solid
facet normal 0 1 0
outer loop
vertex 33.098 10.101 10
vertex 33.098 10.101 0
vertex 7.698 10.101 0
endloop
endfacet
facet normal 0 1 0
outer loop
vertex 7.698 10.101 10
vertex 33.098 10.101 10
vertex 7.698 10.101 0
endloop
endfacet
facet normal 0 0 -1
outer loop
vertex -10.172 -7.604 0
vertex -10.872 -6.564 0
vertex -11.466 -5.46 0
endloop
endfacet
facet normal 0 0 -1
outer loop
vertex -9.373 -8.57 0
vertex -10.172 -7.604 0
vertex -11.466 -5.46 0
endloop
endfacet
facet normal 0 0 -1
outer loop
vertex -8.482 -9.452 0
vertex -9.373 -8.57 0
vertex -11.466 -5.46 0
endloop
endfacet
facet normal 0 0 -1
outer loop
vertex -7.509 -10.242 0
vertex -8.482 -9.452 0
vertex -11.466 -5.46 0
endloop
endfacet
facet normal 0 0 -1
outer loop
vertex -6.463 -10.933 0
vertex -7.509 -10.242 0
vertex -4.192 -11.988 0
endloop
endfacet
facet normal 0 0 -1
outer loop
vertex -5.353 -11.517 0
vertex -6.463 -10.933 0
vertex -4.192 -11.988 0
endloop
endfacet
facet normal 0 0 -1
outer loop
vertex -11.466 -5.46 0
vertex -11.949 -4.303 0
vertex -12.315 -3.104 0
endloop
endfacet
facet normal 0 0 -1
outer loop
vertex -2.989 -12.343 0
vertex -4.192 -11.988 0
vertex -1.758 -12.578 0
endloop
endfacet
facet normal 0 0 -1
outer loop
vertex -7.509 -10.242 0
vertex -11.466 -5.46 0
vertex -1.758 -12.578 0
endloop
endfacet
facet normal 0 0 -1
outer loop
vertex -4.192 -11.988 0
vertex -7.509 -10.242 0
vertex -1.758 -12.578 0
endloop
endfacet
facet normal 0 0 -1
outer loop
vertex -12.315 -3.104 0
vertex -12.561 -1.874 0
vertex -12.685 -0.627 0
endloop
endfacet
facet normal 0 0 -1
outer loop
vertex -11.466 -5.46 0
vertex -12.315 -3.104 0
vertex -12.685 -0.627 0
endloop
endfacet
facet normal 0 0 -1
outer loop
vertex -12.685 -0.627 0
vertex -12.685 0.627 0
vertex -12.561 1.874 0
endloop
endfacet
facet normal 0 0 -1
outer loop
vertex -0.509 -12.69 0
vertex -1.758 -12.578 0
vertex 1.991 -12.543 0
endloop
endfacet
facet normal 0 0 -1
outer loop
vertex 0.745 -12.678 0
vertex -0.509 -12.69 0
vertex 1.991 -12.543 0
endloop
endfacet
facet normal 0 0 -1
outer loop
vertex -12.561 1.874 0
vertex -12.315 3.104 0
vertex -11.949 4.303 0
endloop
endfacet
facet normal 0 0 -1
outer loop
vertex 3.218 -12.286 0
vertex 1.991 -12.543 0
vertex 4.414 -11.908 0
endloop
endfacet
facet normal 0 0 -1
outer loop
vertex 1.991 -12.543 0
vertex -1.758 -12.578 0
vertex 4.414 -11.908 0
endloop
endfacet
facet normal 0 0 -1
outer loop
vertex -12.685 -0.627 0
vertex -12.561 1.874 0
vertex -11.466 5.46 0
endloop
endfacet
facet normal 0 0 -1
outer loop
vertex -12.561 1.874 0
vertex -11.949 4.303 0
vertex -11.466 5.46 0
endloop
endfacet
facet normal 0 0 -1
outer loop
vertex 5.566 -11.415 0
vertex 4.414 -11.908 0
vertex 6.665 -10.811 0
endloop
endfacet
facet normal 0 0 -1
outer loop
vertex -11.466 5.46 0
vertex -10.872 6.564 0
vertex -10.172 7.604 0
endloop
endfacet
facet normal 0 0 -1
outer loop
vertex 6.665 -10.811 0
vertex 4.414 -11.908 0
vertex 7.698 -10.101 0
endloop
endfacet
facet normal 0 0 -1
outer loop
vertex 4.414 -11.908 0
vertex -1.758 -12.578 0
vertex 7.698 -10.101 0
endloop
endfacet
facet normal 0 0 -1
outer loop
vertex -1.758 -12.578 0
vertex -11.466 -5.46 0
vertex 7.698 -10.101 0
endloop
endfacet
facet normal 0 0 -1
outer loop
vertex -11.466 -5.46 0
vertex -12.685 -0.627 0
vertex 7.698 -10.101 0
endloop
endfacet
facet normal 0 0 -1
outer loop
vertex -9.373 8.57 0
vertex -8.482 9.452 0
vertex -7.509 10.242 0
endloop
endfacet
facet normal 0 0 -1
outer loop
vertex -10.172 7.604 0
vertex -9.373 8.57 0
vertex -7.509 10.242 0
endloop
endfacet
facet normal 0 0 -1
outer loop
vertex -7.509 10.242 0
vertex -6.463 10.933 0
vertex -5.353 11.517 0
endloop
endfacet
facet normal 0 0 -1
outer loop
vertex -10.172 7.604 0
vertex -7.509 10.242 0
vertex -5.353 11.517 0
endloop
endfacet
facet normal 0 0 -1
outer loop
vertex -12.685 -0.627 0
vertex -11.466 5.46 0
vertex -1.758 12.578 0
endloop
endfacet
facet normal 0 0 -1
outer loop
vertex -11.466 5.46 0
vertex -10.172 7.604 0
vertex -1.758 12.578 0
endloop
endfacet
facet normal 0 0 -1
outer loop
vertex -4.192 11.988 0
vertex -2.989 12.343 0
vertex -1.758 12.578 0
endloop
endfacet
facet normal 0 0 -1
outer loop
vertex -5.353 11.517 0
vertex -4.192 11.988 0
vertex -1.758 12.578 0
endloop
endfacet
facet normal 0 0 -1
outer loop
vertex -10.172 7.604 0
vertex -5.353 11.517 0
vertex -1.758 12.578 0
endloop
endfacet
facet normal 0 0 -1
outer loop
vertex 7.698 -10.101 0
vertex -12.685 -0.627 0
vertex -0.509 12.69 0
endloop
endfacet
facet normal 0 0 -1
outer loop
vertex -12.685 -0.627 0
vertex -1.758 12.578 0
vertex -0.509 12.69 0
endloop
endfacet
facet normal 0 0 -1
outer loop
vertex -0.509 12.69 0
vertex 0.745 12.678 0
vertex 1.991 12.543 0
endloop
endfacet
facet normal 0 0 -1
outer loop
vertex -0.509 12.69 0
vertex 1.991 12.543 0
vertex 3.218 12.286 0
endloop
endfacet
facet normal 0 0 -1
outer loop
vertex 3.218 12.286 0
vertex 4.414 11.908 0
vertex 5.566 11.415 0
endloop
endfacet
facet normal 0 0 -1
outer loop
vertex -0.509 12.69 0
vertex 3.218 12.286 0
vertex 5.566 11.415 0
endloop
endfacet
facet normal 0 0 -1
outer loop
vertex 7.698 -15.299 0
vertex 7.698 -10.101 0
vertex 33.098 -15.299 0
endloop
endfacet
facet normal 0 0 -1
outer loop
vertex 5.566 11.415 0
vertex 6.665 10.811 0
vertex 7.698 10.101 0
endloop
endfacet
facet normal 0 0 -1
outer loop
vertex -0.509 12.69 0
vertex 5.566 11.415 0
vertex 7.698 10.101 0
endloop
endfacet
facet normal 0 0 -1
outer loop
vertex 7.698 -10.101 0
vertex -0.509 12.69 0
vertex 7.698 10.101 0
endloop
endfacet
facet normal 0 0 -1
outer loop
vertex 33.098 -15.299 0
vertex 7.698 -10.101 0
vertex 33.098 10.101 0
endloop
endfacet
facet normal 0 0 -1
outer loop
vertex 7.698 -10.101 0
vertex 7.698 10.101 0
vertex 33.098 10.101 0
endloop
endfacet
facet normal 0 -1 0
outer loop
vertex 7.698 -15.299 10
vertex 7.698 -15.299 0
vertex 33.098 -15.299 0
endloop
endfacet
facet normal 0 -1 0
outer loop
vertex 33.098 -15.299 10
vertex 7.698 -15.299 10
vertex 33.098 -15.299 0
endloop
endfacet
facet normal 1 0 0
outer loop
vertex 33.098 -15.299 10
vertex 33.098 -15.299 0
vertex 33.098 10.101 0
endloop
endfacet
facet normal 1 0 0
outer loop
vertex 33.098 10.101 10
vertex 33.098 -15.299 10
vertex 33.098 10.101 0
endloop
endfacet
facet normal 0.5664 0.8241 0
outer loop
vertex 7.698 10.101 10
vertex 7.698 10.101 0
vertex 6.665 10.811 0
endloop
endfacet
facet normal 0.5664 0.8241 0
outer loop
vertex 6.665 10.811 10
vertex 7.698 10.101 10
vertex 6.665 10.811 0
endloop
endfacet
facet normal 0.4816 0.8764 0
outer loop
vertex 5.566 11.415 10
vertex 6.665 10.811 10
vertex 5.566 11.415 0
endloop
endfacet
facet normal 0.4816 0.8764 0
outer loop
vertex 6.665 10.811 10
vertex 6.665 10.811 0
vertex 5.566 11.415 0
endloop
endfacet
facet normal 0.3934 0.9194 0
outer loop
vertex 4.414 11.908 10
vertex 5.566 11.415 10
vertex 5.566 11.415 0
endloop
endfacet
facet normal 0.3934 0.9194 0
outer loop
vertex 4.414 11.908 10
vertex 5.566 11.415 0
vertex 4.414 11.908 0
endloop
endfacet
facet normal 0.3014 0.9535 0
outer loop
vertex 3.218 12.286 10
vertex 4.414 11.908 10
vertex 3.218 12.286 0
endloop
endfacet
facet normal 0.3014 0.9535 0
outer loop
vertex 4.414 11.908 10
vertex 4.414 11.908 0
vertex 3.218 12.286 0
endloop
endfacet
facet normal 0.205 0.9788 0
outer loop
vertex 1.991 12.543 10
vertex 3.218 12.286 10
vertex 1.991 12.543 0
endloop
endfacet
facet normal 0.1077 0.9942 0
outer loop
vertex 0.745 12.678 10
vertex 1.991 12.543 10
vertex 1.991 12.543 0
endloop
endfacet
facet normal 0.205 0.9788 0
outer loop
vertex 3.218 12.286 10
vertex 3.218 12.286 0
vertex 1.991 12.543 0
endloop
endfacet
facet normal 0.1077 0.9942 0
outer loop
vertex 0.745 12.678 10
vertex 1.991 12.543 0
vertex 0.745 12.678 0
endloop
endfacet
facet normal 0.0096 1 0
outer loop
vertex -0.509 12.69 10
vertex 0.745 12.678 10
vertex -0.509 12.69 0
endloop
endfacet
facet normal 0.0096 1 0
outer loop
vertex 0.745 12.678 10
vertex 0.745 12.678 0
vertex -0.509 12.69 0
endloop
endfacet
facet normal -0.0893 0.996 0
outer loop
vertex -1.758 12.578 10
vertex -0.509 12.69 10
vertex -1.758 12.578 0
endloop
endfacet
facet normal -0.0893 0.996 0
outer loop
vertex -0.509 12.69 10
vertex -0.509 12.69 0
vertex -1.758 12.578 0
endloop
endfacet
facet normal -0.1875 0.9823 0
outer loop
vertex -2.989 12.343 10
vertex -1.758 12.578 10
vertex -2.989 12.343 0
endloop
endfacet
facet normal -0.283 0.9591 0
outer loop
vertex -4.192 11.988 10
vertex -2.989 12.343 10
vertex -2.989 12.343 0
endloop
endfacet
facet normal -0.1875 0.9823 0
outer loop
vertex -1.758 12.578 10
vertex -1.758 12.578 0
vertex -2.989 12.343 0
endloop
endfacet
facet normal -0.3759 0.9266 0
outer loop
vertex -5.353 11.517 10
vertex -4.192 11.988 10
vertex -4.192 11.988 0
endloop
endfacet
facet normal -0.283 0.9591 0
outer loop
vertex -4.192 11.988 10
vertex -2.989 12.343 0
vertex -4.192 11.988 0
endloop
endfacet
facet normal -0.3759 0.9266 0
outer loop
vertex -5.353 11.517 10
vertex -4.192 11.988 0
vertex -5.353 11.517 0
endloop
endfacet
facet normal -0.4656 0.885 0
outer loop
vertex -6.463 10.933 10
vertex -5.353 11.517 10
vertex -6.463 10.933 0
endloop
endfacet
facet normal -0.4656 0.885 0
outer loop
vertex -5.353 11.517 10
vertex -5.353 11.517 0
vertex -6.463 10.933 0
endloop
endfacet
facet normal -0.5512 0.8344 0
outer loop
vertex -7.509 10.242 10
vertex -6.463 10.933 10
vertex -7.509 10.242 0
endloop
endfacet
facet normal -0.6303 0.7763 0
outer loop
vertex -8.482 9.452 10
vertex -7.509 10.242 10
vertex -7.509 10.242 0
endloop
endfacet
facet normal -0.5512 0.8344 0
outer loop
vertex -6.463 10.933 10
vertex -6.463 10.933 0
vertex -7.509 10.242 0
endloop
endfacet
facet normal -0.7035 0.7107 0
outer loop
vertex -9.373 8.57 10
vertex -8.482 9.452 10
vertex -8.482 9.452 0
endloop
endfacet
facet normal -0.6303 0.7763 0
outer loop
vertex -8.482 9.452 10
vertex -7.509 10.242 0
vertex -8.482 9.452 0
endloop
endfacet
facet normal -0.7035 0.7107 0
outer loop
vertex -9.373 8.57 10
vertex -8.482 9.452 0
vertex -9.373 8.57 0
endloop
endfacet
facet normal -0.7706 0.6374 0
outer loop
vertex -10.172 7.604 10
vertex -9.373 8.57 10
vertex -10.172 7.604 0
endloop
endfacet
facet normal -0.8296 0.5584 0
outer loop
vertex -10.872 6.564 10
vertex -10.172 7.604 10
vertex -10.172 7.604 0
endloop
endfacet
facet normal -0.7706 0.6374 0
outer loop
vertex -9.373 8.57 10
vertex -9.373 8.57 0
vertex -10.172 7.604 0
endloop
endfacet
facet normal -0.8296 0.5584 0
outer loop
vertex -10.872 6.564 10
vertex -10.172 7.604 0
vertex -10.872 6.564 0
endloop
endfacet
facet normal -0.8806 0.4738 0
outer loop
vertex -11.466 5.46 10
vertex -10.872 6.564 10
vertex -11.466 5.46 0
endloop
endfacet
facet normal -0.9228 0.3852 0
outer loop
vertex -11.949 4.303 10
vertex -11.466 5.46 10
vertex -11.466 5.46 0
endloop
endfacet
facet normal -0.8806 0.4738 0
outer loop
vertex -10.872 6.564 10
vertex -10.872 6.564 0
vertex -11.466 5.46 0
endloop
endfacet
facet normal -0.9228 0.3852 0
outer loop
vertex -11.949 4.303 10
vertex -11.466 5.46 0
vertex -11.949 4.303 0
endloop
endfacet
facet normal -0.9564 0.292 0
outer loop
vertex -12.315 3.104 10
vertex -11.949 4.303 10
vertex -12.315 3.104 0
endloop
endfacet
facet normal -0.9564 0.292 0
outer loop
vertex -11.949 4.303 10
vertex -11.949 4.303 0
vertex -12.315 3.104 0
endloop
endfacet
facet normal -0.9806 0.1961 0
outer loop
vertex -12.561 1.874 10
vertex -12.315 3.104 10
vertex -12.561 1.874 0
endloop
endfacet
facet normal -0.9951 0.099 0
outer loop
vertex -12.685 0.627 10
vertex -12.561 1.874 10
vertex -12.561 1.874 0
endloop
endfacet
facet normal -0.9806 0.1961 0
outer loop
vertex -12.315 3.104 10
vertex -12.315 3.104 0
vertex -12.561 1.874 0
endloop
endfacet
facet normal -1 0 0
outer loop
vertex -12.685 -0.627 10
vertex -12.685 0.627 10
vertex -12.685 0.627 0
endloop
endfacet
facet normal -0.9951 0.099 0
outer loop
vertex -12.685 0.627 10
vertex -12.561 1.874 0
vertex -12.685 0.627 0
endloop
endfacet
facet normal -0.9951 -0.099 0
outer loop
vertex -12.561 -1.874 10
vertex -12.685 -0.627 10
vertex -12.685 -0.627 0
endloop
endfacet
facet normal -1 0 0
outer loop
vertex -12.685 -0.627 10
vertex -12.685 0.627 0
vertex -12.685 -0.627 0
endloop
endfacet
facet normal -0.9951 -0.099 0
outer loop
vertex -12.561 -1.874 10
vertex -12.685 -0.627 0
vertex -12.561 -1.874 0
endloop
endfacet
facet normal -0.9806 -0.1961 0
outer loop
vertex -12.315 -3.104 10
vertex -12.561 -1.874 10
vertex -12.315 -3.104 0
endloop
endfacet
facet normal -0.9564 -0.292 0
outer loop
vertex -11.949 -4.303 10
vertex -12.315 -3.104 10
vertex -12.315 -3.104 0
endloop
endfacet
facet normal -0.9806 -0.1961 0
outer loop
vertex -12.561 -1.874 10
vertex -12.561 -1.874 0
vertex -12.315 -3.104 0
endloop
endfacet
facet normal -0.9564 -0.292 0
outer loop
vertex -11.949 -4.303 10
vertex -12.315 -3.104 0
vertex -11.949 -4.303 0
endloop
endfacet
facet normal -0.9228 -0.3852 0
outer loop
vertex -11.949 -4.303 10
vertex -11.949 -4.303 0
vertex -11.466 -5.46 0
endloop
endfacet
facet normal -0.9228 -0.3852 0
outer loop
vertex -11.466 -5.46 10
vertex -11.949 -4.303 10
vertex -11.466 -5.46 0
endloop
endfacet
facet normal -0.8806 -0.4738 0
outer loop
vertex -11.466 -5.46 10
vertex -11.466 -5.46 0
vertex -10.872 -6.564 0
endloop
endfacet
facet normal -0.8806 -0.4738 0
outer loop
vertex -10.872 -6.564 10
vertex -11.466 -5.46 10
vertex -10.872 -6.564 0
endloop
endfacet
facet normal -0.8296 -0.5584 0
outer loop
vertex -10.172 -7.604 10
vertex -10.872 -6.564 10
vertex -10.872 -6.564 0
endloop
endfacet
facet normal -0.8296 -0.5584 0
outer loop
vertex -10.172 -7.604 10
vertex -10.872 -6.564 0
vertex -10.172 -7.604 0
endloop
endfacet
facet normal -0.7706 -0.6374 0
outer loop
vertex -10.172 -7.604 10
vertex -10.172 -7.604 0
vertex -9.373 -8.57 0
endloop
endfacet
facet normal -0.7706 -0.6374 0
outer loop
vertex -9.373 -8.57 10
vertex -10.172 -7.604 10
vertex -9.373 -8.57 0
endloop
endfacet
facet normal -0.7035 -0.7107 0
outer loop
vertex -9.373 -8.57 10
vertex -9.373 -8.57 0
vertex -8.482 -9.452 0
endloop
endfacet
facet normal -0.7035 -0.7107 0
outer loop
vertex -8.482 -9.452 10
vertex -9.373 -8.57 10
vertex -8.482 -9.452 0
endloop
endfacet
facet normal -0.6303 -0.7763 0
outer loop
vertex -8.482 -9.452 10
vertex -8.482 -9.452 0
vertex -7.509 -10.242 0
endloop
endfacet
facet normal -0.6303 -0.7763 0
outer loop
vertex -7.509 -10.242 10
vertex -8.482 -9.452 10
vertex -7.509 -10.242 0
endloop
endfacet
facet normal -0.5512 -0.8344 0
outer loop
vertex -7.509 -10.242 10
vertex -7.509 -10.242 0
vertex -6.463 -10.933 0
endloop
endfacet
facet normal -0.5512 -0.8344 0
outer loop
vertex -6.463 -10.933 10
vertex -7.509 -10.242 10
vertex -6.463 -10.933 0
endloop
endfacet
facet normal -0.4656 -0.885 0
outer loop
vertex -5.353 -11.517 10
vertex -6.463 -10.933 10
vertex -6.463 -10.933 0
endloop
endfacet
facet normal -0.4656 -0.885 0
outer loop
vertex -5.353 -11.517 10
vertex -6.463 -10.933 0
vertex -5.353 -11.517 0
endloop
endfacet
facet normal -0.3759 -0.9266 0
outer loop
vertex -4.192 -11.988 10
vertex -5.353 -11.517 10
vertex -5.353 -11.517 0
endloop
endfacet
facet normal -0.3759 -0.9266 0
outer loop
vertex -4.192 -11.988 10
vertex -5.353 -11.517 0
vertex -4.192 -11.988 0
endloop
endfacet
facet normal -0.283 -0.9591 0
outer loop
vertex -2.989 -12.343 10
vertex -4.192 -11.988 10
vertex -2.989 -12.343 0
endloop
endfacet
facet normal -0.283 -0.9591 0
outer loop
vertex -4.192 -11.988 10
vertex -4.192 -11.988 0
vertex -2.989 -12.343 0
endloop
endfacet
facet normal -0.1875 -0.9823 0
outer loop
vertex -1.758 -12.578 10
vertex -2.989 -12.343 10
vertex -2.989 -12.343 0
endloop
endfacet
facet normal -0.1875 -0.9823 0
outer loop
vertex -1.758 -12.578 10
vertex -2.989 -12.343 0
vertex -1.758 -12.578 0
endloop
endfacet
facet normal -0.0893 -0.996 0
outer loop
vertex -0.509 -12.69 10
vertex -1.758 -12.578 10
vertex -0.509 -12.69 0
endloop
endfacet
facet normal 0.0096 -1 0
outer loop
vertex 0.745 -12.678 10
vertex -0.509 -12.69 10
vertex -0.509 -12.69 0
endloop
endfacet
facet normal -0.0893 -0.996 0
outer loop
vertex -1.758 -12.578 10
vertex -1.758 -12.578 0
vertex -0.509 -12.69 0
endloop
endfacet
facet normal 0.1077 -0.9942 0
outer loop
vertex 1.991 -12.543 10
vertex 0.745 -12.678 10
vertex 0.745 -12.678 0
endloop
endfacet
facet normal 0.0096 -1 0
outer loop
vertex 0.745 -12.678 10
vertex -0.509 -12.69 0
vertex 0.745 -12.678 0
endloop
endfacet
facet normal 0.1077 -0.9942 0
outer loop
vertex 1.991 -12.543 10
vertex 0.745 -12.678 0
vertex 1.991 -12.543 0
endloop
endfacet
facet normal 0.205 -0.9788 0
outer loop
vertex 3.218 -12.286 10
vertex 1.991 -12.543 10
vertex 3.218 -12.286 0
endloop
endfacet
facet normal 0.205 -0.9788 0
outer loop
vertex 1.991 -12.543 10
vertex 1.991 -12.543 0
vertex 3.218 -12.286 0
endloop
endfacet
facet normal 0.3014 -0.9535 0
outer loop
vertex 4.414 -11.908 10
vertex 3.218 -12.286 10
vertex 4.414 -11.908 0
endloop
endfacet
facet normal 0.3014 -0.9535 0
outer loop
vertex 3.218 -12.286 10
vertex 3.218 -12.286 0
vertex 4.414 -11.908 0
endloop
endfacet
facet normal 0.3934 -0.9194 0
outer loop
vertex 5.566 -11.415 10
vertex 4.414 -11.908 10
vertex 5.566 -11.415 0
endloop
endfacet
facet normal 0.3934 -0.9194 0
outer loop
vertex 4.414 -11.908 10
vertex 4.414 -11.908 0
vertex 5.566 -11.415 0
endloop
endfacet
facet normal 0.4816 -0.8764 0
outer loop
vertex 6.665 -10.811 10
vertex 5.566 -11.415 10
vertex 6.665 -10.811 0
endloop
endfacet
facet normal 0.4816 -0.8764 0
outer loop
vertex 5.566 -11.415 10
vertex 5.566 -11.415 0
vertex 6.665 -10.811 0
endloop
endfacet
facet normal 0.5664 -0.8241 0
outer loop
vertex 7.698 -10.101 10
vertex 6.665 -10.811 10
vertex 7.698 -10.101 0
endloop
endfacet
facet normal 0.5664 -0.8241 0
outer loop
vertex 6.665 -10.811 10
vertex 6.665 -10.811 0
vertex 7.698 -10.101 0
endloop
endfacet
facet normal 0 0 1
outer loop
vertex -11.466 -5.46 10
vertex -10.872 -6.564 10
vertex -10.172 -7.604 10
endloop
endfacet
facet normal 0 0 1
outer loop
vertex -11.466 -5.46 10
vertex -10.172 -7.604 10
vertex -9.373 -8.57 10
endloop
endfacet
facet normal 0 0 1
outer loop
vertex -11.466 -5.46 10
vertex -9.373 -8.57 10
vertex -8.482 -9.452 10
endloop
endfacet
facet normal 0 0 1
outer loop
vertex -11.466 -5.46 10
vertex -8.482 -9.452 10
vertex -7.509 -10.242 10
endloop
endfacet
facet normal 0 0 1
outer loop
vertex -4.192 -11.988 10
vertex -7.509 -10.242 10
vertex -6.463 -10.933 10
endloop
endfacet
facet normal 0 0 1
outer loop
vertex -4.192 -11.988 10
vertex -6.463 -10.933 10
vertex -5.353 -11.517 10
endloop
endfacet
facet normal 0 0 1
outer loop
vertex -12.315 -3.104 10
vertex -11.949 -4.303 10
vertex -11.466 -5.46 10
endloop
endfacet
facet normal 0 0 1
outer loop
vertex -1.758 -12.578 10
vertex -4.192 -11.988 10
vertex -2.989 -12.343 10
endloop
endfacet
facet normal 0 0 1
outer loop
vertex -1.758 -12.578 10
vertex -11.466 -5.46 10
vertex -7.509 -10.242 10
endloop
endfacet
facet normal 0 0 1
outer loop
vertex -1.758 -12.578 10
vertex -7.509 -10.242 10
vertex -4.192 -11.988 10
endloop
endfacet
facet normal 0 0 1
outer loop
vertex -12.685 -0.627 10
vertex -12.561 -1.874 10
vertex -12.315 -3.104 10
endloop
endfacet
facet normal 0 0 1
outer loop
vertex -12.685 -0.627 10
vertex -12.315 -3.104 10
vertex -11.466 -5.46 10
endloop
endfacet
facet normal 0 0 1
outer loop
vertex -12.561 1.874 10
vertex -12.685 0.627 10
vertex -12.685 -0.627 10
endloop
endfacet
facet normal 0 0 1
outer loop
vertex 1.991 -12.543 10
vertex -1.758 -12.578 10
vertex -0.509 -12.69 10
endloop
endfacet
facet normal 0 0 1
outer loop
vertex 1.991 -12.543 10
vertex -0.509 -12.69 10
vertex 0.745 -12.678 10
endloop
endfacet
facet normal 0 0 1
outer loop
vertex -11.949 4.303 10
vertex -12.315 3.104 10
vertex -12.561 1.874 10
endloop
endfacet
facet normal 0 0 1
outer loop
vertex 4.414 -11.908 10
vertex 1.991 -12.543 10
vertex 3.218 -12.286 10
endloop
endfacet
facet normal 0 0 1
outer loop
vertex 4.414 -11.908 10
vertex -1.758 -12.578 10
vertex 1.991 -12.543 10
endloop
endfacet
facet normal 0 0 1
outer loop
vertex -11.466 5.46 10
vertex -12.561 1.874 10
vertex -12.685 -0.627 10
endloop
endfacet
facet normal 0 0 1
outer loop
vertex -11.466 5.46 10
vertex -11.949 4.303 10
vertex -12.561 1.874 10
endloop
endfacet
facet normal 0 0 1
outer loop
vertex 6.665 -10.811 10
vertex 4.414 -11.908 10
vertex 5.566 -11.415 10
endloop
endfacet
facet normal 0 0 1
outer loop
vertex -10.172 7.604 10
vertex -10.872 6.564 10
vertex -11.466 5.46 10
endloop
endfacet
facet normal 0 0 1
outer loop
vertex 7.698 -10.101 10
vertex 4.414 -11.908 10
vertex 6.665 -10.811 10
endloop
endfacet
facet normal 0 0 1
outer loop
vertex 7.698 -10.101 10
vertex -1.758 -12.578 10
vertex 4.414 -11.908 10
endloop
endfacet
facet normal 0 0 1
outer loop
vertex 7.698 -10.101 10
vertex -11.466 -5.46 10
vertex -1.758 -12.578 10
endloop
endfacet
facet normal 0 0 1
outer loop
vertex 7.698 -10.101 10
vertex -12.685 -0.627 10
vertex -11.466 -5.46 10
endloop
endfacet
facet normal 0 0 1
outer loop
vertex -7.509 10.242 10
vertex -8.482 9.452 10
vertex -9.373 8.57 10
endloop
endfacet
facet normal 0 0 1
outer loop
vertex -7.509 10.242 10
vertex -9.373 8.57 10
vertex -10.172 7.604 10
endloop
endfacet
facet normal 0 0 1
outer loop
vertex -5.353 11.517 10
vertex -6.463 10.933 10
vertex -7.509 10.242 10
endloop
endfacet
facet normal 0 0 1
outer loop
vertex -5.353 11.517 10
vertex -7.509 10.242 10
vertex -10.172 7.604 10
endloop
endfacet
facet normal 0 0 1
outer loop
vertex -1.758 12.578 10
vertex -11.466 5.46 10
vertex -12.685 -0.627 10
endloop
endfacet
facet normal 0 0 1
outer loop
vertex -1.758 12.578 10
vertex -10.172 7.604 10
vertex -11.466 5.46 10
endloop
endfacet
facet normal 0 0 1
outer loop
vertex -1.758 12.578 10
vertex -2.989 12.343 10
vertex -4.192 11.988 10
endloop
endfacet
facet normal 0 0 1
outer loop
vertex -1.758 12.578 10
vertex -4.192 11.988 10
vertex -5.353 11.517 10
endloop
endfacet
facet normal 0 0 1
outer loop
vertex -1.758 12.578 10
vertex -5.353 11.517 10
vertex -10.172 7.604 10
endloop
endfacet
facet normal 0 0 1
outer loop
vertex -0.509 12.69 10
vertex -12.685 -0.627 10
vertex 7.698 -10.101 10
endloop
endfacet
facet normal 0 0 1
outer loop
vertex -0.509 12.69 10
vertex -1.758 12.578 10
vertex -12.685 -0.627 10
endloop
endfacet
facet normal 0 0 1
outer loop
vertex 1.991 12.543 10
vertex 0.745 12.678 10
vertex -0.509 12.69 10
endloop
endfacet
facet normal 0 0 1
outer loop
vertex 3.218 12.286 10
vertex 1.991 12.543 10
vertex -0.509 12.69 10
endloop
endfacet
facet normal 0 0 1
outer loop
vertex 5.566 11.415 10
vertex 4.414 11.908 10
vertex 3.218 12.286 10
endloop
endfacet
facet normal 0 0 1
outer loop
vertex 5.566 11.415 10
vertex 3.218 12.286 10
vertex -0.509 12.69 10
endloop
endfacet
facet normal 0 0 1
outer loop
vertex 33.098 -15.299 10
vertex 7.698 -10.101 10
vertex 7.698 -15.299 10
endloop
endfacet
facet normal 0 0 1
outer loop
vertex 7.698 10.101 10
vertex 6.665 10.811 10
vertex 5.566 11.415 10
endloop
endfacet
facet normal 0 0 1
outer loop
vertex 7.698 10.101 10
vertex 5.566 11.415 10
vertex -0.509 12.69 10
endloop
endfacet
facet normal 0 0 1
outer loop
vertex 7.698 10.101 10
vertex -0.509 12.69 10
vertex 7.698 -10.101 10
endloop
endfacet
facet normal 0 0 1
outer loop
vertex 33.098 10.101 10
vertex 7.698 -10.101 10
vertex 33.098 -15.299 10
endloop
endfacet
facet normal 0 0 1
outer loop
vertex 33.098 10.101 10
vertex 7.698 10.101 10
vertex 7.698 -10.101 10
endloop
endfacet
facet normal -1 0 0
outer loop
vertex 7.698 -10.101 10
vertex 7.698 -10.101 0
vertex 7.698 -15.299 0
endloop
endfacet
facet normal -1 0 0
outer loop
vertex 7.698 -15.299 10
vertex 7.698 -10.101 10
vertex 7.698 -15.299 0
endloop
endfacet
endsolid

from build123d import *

# Parameters (mm, degrees)
F1_DEPTH = 10


with BuildPart() as f1:
    # F0 (on Top) → F1 (new body)
    with BuildSketch(Plane.XY):
        with BuildLine():
            ThreePointArc((7.6980242142, -10.1010109988), (11.3810128618, -5.6358270236), (12.7, 0))
            ThreePointArc((12.7, 0), (11.3810128618, 5.6358270236), (7.6980242142, 10.1010109988))
            Line((7.6980242142, 10.1010109988), (7.6980242142, -10.1010109988))
        make_face()
        with BuildLine():
            ThreePointArc((7.6980242142, 10.1010109988), (11.3810128618, 5.6358270236), (12.7, 0))
            ThreePointArc((12.7, 0), (11.3810128618, -5.6358270236), (7.6980242142, -10.1010109988))
            Line((7.6980242142, -10.1010109988), (7.6980242142, -15.2989890012))
            Line((7.6980242142, -15.2989890012), (33.0980242142, -15.2989890012))
            Line((33.0980242142, -15.2989890012), (33.0980242142, 10.1010109988))
            Line((33.0980242142, 10.1010109988), (7.6980242142, 10.1010109988))
        make_face()
        with BuildLine():
            Line((7.6980242142, -10.1010109988), (7.6980242142, 10.1010109988))
            ThreePointArc((7.6980242142, 10.1010109988), (-12.7, 0), (7.6980242142, -10.1010109988))
        make_face()
    extrude(amount=F1_DEPTH)


solid = f1.part
